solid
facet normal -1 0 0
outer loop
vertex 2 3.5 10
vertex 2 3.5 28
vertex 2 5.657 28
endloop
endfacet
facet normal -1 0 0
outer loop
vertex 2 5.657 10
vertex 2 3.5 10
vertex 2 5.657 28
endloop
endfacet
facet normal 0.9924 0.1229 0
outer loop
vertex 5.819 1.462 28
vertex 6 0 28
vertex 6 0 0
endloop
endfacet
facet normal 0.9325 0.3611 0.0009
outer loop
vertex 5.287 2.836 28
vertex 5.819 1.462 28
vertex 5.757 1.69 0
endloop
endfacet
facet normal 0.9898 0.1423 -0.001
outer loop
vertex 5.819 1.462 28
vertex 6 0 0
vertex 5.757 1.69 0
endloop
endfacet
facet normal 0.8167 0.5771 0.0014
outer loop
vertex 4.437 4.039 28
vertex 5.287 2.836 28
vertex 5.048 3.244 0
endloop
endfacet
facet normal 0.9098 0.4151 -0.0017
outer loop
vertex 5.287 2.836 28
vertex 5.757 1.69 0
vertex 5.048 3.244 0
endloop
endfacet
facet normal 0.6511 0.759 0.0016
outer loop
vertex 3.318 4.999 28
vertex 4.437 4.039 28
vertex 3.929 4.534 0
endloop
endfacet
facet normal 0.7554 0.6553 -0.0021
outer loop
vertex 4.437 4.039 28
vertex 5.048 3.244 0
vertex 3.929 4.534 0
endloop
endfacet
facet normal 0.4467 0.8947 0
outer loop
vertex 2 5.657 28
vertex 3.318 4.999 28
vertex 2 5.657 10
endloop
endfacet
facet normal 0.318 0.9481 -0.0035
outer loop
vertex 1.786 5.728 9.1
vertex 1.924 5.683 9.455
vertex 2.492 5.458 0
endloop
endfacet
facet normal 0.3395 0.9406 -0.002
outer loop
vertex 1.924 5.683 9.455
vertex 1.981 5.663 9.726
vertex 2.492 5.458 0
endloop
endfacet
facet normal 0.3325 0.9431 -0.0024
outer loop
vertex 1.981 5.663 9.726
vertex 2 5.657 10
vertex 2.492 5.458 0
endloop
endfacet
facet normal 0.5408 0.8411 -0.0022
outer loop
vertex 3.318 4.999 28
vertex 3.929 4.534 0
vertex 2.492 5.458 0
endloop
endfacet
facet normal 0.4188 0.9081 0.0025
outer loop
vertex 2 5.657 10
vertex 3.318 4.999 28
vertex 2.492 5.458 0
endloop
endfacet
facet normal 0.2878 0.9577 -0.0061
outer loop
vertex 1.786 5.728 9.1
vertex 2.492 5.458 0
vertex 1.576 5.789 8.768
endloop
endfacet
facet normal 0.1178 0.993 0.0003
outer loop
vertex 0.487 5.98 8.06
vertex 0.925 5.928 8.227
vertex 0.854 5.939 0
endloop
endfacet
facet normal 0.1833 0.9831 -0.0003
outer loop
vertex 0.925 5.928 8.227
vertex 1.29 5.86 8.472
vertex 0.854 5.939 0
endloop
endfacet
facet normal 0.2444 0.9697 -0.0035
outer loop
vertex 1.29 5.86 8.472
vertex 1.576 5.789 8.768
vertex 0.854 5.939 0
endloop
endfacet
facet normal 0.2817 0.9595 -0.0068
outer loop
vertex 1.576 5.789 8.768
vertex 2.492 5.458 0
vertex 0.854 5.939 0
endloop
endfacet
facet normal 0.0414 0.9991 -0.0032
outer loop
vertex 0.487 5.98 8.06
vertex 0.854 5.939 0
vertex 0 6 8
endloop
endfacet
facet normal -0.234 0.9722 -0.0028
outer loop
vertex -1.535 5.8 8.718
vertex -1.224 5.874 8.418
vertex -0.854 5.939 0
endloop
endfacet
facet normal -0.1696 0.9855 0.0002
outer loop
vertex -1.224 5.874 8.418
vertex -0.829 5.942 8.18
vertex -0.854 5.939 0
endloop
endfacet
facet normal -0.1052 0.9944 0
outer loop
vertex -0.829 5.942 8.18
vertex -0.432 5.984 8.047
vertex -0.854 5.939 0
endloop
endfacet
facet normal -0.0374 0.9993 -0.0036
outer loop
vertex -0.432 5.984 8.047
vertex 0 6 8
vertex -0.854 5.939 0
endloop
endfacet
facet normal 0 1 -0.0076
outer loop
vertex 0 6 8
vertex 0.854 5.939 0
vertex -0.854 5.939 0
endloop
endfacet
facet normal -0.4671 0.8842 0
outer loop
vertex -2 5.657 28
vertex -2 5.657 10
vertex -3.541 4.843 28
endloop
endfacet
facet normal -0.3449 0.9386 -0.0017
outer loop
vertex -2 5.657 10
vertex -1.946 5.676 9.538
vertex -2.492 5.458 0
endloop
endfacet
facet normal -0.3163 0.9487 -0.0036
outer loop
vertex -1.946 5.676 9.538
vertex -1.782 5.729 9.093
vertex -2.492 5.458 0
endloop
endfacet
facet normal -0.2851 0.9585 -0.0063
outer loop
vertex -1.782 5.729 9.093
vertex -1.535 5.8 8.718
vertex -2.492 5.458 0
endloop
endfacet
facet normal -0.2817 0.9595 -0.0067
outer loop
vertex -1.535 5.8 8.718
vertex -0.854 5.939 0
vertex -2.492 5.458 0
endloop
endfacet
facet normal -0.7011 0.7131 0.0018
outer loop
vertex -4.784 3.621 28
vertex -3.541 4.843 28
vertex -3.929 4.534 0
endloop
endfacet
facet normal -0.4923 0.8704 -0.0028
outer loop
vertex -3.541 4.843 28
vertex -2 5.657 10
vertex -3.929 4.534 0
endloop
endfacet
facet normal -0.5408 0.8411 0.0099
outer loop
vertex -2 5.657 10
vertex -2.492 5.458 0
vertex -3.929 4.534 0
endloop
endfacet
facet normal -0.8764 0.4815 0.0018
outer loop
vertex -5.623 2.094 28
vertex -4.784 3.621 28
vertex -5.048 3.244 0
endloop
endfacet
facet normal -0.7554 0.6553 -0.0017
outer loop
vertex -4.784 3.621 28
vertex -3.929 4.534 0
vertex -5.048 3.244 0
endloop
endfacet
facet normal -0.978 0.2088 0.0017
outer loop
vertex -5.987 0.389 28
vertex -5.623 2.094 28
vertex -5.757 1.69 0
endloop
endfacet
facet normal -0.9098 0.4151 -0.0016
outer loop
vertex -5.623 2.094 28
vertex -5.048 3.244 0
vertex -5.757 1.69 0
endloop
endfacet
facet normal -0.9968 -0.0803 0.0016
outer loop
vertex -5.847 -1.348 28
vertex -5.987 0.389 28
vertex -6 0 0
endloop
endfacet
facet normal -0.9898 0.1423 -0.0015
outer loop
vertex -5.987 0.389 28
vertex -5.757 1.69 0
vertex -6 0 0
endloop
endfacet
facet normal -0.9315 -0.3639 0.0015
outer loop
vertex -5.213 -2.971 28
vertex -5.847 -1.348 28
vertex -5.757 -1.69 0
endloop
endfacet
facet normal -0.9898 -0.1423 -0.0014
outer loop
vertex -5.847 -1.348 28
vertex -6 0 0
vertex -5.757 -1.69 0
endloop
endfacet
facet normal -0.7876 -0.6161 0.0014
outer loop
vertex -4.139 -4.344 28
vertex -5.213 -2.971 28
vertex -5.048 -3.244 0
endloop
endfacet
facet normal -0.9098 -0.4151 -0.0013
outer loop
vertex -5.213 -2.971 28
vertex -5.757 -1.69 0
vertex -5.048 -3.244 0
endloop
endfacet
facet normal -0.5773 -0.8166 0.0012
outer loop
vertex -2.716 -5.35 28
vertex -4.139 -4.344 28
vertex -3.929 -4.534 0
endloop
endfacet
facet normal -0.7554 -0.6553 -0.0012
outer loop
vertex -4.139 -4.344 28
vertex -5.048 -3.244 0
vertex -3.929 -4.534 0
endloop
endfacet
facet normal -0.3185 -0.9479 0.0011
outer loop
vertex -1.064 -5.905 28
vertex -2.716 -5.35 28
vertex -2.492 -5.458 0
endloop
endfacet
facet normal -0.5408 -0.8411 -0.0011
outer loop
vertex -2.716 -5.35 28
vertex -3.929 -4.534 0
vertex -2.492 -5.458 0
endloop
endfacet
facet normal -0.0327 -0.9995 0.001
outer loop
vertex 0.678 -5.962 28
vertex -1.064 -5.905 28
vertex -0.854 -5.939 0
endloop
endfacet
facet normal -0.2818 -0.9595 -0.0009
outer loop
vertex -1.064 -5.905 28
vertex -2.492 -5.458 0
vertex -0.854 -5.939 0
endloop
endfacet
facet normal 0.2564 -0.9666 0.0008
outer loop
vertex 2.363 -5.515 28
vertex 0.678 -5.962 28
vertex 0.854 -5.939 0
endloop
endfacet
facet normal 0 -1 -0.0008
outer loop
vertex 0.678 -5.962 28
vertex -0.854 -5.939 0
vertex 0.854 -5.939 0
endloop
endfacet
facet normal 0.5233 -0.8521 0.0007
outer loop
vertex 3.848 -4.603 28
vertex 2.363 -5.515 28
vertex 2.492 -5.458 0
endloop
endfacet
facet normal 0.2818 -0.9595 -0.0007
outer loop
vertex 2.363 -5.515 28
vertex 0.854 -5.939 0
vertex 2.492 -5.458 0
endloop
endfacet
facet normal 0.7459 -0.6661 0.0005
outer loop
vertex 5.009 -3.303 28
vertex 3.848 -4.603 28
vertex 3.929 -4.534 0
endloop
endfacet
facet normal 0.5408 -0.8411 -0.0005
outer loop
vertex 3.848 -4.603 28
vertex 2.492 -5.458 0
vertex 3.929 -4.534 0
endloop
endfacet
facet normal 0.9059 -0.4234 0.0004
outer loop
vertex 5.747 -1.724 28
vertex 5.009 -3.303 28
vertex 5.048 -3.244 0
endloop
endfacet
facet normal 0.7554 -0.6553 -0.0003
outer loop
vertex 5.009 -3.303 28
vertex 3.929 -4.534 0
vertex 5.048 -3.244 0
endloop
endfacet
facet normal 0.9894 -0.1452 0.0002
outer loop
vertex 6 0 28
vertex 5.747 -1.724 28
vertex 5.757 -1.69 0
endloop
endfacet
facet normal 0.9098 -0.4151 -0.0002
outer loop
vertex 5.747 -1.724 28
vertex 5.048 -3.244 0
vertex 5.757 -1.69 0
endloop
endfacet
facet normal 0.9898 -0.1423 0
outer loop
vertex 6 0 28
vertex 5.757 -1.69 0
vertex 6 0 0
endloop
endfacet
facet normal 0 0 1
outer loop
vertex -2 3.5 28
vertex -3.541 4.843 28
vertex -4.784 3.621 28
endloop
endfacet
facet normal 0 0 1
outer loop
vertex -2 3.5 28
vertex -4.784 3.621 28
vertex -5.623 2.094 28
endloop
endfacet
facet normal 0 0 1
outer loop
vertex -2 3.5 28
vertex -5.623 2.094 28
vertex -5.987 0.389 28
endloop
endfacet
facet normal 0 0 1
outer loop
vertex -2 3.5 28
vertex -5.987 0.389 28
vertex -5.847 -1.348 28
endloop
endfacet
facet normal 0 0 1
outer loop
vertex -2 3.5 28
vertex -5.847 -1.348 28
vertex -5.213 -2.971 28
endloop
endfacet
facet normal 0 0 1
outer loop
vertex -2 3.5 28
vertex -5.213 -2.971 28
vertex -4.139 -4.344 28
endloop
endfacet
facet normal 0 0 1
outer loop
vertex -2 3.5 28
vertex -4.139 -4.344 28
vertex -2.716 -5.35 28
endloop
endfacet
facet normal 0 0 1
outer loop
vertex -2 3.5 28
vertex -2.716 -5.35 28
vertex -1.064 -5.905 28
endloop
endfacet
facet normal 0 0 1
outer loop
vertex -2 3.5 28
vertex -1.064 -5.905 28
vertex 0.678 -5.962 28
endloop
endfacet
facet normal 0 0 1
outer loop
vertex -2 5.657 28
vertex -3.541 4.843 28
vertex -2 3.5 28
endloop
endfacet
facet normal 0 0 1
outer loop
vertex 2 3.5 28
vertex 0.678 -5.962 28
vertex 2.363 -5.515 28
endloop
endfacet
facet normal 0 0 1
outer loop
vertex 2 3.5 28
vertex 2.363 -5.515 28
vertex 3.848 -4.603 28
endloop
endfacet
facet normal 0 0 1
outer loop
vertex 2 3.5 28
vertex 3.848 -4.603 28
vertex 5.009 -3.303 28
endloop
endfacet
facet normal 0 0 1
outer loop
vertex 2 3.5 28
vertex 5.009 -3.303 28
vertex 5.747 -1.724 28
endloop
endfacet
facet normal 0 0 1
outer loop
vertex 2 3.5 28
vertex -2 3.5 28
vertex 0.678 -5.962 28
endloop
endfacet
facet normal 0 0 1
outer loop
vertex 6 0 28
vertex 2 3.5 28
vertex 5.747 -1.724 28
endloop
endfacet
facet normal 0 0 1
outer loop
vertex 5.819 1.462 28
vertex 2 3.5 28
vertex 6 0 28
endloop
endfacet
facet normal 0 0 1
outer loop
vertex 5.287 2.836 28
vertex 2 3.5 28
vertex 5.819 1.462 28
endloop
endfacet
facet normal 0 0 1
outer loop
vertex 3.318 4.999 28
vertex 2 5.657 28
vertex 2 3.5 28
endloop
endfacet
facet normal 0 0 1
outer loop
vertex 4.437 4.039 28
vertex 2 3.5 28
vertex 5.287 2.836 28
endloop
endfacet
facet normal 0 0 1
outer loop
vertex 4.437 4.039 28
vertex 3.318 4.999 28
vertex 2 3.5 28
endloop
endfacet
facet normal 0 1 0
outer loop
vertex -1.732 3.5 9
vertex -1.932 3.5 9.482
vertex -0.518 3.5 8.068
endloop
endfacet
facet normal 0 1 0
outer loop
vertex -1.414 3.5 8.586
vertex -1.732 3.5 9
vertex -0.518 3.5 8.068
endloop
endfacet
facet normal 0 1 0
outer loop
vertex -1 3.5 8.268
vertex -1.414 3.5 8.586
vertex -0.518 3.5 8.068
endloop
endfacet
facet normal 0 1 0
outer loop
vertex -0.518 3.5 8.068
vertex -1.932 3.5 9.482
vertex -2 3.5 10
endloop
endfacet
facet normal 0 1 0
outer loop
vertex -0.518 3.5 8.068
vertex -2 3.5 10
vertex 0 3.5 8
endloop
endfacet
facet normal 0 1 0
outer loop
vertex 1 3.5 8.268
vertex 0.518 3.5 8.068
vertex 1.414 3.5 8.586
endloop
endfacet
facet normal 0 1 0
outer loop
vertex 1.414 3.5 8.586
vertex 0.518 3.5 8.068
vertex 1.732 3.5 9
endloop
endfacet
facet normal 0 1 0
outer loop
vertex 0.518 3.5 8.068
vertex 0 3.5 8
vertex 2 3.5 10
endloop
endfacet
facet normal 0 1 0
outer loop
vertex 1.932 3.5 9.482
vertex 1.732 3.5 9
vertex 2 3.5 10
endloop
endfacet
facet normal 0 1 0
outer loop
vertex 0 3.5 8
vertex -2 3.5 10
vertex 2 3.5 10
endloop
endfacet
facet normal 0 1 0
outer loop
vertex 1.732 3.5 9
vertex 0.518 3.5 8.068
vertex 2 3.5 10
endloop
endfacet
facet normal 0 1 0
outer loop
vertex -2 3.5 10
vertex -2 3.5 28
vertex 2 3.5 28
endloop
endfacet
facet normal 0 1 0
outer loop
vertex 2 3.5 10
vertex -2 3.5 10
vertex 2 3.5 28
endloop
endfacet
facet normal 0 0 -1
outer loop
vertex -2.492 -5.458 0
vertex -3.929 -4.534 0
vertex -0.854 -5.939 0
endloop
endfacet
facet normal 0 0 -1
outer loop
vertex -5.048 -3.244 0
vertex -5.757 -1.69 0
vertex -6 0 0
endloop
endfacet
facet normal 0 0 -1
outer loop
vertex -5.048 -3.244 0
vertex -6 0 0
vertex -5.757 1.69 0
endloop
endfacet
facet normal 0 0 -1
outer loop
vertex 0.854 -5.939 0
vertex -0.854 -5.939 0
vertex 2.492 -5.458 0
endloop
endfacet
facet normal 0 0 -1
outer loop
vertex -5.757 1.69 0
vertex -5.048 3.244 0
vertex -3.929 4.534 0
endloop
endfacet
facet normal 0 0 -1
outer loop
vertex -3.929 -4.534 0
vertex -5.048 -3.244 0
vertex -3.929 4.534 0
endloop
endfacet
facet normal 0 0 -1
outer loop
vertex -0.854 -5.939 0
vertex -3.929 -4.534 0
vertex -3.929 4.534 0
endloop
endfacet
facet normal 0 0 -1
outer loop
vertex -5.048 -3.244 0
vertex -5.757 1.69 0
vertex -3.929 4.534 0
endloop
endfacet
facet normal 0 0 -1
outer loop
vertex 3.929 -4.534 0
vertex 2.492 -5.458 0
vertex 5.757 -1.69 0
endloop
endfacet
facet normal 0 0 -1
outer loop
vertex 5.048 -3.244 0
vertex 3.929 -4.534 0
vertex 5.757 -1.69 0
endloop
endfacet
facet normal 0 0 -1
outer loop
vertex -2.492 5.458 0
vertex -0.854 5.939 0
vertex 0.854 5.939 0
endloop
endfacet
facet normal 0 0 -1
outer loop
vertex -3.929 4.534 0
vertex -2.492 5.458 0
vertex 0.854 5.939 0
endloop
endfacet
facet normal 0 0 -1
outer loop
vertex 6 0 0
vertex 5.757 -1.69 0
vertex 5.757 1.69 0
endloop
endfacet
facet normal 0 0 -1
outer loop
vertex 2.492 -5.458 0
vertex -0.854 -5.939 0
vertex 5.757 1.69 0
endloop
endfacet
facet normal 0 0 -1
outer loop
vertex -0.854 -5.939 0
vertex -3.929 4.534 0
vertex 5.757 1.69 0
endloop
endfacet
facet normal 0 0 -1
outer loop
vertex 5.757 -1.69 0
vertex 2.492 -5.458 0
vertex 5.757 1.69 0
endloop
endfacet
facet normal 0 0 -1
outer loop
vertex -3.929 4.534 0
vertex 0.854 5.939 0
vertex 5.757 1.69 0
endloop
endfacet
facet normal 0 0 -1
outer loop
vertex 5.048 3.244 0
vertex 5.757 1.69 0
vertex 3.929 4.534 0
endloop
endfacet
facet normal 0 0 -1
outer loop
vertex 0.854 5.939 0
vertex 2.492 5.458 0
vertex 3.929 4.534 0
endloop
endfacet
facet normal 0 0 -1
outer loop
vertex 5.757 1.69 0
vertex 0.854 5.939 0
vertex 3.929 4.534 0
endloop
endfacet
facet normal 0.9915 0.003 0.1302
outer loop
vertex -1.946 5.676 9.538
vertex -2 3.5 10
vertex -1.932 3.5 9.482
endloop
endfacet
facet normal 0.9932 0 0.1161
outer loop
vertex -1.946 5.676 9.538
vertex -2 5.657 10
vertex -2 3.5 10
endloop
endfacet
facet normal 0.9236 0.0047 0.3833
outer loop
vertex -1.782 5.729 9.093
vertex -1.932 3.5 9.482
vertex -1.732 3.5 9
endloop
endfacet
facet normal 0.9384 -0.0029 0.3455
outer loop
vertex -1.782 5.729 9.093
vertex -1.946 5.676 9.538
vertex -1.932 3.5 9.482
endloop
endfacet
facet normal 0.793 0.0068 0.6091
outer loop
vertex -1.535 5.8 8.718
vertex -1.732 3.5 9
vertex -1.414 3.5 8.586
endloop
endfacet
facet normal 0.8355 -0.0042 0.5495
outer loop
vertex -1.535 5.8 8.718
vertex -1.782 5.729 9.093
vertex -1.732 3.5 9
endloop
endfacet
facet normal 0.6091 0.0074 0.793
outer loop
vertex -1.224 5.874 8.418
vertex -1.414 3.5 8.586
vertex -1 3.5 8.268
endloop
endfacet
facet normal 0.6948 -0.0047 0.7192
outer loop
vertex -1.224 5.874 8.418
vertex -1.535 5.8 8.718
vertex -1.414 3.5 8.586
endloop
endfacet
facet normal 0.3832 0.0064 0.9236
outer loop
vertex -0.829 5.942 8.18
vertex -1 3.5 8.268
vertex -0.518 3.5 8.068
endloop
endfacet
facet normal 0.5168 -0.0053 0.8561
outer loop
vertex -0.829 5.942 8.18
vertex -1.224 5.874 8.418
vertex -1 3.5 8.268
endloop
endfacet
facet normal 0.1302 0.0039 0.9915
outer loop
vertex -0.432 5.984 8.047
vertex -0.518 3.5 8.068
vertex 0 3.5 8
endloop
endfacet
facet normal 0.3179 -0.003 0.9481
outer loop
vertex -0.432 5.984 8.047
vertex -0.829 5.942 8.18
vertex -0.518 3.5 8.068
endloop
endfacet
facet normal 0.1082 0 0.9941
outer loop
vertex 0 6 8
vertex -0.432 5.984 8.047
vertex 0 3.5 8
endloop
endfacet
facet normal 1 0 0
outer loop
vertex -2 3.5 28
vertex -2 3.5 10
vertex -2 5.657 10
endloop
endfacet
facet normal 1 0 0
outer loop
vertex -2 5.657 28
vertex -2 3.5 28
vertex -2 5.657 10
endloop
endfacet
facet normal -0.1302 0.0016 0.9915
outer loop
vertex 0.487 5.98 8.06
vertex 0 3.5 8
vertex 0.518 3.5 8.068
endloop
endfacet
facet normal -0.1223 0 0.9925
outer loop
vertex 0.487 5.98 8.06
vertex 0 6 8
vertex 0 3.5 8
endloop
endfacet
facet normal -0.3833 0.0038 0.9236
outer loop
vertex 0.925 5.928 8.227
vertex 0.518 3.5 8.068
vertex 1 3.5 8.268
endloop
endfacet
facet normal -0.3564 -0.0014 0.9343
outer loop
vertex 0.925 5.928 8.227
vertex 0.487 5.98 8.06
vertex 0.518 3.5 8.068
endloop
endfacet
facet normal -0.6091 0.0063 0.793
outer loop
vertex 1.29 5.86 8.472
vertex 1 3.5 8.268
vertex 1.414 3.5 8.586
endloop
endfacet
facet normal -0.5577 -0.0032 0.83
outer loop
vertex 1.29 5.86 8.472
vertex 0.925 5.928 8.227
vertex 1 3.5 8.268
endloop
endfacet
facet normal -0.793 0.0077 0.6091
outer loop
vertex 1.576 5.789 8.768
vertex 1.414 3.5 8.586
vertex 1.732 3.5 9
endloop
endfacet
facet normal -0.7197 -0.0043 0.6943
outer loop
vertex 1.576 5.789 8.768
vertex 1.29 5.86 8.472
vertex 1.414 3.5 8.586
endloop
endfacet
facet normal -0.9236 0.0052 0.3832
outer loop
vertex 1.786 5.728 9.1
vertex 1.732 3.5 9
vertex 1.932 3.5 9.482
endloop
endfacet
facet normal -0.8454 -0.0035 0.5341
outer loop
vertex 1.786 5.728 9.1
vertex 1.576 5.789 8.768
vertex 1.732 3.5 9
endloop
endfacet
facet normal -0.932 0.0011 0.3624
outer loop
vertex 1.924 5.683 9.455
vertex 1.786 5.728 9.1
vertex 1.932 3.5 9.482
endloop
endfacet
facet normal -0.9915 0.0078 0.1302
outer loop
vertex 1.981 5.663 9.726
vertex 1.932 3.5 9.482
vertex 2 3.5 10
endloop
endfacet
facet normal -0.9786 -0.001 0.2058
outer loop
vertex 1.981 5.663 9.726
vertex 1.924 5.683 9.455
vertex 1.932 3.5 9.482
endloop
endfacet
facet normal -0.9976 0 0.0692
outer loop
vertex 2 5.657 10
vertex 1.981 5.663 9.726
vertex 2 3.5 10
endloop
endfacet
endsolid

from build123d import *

# Parameters (mm, degrees)
SKETCH1_R           = 6
BOSS_EXTRUDE1_DEPTH = 28
SKETCH2_W           = 4
SKETCH2_H           = 2.5
CUT_EXTRUDE1_DEPTH  = 20
FILLET2_R           = 2
FILLET3_R           = 2


with BuildPart() as part:
    # Sketch1 → Boss-Extrude1 (new body)
    with BuildSketch(Plane.XY):
        Circle(SKETCH1_R)
    extrude(amount=BOSS_EXTRUDE1_DEPTH)

    # Sketch2 → Cut-Extrude1 (cut)
    with BuildSketch(Plane.XY.offset(28)):
        with Locations((0, 4.75)):
            Rectangle(SKETCH2_W, SKETCH2_H)
    extrude(amount=-CUT_EXTRUDE1_DEPTH, mode=Mode.SUBTRACT)

    # Fillet2
    fillet2_edges = [part.edges().sort_by_distance(p)[0] for p in [
        (-2, 4.578427125, 8),
    ]]
    fillet(fillet2_edges, radius=FILLET2_R)

    # Fillet3
    fillet3_edges = [part.edges().sort_by_distance(p)[0] for p in [
        (2, 4.578427125, 8),
    ]]
    fillet(fillet3_edges, radius=FILLET3_R - 0.0001)  # a hair under: the kernel refuses the full size


solid = part.part
